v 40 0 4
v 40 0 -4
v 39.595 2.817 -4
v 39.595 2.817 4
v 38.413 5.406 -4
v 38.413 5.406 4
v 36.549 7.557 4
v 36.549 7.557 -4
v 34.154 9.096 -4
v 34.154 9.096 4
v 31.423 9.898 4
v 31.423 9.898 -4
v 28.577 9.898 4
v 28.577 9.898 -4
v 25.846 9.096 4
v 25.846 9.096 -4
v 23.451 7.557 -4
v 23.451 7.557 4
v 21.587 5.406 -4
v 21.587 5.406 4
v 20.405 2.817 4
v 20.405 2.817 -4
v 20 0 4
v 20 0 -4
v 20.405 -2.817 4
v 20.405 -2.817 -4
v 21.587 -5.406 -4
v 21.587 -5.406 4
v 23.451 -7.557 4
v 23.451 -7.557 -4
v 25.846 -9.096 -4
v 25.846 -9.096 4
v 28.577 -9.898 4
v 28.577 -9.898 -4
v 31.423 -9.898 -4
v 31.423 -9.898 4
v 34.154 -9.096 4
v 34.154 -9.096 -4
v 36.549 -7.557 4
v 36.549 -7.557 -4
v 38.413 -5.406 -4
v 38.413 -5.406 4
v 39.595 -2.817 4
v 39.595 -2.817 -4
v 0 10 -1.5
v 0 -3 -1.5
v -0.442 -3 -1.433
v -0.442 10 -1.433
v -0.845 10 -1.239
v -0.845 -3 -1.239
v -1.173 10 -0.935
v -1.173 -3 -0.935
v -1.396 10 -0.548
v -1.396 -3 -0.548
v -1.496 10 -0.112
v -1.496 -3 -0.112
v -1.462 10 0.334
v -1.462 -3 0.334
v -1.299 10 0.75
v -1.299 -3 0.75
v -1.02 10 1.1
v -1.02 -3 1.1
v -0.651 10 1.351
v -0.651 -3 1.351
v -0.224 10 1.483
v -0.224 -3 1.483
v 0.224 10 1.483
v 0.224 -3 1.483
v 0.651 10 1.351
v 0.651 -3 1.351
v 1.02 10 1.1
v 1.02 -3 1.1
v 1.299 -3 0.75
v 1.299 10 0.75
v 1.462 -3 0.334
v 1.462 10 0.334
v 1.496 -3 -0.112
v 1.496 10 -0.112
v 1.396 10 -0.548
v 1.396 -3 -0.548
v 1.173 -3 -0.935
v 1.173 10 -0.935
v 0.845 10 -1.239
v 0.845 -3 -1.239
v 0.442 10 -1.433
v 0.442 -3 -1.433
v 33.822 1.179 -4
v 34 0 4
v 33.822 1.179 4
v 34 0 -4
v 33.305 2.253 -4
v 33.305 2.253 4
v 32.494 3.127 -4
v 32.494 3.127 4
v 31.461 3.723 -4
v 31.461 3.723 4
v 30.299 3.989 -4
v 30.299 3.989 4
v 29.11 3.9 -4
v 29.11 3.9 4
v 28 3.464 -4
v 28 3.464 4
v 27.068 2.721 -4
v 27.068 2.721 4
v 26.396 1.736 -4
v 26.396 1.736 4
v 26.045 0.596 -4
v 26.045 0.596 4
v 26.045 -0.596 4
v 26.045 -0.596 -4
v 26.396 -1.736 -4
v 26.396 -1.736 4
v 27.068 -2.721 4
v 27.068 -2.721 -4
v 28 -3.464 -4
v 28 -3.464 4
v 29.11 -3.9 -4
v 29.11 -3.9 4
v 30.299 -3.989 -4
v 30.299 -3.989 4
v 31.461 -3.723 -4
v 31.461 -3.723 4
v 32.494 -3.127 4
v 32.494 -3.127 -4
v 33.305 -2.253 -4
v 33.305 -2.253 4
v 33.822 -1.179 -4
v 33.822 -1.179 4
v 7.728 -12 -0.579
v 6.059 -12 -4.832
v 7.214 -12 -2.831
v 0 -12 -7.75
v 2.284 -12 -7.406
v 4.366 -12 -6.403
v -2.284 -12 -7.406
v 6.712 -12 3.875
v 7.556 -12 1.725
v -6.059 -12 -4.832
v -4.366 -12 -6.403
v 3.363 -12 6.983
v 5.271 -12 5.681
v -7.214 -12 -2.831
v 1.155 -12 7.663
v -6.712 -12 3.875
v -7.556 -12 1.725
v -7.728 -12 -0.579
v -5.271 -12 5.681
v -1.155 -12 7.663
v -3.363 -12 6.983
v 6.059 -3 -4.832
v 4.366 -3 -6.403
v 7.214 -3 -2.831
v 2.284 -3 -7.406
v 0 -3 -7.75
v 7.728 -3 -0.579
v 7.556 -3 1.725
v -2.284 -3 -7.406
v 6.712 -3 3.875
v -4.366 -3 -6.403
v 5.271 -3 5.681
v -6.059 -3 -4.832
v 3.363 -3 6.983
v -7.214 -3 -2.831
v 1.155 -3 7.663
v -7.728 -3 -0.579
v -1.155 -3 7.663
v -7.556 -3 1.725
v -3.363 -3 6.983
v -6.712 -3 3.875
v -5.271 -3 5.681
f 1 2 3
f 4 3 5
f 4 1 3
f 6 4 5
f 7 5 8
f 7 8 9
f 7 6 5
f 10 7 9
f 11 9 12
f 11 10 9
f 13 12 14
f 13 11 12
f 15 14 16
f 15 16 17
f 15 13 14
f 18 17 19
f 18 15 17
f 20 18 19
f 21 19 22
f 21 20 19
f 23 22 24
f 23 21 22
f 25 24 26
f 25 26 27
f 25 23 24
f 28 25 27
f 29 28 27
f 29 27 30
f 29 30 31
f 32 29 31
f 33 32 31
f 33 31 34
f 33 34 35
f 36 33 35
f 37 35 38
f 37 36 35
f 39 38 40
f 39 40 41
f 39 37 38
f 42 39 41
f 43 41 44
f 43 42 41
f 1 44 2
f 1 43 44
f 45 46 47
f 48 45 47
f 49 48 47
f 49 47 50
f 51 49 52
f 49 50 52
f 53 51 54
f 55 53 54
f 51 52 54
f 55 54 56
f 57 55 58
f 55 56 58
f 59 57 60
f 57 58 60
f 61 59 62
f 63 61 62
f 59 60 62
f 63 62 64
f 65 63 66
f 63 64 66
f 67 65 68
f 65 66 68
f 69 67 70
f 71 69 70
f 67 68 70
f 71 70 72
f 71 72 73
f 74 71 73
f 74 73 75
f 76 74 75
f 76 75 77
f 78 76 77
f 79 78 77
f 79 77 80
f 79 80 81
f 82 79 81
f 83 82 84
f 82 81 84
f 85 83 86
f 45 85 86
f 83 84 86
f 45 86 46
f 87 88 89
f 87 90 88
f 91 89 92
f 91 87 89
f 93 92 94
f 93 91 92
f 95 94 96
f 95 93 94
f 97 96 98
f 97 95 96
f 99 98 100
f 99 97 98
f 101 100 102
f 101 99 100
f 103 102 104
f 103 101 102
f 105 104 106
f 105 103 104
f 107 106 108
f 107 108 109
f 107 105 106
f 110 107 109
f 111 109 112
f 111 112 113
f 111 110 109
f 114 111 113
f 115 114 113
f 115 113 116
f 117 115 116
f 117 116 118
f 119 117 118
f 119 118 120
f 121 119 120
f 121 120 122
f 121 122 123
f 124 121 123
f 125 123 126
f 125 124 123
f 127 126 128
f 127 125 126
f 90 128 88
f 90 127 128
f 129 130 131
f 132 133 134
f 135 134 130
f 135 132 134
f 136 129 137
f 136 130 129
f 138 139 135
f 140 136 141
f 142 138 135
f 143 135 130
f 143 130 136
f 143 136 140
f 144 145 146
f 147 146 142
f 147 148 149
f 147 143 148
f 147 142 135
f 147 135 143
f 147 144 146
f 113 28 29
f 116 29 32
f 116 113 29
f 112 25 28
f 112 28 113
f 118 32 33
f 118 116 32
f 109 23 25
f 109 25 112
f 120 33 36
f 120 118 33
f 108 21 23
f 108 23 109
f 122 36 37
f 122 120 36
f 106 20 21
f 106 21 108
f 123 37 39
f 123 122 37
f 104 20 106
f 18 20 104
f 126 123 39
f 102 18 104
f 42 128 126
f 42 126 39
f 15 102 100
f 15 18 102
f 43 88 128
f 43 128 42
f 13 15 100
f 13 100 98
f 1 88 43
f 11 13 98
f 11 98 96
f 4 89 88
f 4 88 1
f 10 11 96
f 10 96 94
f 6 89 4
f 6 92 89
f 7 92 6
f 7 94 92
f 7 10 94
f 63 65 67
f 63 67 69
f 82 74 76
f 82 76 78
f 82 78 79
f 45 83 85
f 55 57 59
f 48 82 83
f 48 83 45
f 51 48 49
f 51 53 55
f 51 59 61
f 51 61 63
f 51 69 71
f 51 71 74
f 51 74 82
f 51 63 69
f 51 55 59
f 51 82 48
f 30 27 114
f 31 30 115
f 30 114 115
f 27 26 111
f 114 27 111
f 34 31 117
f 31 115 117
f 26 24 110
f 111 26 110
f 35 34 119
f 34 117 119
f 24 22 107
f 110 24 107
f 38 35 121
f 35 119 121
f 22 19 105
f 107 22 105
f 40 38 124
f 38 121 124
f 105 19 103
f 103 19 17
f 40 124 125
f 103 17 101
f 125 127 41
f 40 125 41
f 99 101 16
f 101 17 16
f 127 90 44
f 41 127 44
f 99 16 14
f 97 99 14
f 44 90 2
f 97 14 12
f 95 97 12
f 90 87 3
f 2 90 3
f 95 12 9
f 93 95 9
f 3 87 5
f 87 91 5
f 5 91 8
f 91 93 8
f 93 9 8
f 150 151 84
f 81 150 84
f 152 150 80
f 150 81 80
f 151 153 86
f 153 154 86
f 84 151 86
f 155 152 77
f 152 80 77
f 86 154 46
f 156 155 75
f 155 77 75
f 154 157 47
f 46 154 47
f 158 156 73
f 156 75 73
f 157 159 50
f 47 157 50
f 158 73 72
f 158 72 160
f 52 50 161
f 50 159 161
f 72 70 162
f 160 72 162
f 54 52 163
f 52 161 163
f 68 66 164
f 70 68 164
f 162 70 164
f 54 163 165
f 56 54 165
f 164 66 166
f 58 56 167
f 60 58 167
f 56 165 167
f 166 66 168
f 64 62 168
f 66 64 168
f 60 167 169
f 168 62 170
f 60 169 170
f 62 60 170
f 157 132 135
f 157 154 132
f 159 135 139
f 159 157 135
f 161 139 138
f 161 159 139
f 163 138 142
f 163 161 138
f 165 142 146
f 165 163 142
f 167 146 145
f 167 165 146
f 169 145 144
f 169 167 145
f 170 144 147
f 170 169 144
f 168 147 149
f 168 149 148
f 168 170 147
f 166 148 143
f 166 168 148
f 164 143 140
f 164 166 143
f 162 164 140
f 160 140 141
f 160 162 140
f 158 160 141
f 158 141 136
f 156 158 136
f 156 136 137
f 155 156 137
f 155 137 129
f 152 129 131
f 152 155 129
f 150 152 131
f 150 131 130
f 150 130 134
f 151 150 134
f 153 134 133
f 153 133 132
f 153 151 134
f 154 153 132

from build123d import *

# Parameters (mm, degrees)
SKETCH3_R           = 10
SKETCH3_R_2         = 4
ROD_HOLDER_DEPTH    = 4
SKETCH4_W           = 7.75
SKETCH4_H           = 9
SKETCH5_R           = 1.5
BOSS_EXTRUDE2_DEPTH = 13


with BuildPart() as part:
    # Sketch3 → rod holder (new, symmetric)
    with BuildSketch(Plane.XY):
        with Locations((30, 0)):
            Circle(SKETCH3_R)
        with Locations((30, 0)):
            Circle(SKETCH3_R_2, mode=Mode.SUBTRACT)
    extrude(amount=ROD_HOLDER_DEPTH, both=True)


with BuildPart() as body_2:
    # Sketch4 → Revolve5 (revolve)
    with BuildSketch(Plane.XY, mode=Mode.PRIVATE) as revolve5_sk:
        with Locations((3.875, -7.5)):
            Rectangle(SKETCH4_W, SKETCH4_H)
    revolve(revolve5_sk.sketch.rotate(Axis((0, -7.5, 0), (0, 1, 0)), 90), axis=Axis((0, -7.5, 0), (0, 1, 0)))

    # Sketch5 → Boss-Extrude2 (add)
    with BuildSketch(Plane(origin=(0, -3, 0), x_dir=(1, 0, 0), z_dir=(0, 1, 0))):
        with Locations(Location((0, 0, 0), (0, 0, 90))):
            Circle(SKETCH5_R)
    extrude(amount=BOSS_EXTRUDE2_DEPTH)


solid = Compound([part.part, body_2.part])
